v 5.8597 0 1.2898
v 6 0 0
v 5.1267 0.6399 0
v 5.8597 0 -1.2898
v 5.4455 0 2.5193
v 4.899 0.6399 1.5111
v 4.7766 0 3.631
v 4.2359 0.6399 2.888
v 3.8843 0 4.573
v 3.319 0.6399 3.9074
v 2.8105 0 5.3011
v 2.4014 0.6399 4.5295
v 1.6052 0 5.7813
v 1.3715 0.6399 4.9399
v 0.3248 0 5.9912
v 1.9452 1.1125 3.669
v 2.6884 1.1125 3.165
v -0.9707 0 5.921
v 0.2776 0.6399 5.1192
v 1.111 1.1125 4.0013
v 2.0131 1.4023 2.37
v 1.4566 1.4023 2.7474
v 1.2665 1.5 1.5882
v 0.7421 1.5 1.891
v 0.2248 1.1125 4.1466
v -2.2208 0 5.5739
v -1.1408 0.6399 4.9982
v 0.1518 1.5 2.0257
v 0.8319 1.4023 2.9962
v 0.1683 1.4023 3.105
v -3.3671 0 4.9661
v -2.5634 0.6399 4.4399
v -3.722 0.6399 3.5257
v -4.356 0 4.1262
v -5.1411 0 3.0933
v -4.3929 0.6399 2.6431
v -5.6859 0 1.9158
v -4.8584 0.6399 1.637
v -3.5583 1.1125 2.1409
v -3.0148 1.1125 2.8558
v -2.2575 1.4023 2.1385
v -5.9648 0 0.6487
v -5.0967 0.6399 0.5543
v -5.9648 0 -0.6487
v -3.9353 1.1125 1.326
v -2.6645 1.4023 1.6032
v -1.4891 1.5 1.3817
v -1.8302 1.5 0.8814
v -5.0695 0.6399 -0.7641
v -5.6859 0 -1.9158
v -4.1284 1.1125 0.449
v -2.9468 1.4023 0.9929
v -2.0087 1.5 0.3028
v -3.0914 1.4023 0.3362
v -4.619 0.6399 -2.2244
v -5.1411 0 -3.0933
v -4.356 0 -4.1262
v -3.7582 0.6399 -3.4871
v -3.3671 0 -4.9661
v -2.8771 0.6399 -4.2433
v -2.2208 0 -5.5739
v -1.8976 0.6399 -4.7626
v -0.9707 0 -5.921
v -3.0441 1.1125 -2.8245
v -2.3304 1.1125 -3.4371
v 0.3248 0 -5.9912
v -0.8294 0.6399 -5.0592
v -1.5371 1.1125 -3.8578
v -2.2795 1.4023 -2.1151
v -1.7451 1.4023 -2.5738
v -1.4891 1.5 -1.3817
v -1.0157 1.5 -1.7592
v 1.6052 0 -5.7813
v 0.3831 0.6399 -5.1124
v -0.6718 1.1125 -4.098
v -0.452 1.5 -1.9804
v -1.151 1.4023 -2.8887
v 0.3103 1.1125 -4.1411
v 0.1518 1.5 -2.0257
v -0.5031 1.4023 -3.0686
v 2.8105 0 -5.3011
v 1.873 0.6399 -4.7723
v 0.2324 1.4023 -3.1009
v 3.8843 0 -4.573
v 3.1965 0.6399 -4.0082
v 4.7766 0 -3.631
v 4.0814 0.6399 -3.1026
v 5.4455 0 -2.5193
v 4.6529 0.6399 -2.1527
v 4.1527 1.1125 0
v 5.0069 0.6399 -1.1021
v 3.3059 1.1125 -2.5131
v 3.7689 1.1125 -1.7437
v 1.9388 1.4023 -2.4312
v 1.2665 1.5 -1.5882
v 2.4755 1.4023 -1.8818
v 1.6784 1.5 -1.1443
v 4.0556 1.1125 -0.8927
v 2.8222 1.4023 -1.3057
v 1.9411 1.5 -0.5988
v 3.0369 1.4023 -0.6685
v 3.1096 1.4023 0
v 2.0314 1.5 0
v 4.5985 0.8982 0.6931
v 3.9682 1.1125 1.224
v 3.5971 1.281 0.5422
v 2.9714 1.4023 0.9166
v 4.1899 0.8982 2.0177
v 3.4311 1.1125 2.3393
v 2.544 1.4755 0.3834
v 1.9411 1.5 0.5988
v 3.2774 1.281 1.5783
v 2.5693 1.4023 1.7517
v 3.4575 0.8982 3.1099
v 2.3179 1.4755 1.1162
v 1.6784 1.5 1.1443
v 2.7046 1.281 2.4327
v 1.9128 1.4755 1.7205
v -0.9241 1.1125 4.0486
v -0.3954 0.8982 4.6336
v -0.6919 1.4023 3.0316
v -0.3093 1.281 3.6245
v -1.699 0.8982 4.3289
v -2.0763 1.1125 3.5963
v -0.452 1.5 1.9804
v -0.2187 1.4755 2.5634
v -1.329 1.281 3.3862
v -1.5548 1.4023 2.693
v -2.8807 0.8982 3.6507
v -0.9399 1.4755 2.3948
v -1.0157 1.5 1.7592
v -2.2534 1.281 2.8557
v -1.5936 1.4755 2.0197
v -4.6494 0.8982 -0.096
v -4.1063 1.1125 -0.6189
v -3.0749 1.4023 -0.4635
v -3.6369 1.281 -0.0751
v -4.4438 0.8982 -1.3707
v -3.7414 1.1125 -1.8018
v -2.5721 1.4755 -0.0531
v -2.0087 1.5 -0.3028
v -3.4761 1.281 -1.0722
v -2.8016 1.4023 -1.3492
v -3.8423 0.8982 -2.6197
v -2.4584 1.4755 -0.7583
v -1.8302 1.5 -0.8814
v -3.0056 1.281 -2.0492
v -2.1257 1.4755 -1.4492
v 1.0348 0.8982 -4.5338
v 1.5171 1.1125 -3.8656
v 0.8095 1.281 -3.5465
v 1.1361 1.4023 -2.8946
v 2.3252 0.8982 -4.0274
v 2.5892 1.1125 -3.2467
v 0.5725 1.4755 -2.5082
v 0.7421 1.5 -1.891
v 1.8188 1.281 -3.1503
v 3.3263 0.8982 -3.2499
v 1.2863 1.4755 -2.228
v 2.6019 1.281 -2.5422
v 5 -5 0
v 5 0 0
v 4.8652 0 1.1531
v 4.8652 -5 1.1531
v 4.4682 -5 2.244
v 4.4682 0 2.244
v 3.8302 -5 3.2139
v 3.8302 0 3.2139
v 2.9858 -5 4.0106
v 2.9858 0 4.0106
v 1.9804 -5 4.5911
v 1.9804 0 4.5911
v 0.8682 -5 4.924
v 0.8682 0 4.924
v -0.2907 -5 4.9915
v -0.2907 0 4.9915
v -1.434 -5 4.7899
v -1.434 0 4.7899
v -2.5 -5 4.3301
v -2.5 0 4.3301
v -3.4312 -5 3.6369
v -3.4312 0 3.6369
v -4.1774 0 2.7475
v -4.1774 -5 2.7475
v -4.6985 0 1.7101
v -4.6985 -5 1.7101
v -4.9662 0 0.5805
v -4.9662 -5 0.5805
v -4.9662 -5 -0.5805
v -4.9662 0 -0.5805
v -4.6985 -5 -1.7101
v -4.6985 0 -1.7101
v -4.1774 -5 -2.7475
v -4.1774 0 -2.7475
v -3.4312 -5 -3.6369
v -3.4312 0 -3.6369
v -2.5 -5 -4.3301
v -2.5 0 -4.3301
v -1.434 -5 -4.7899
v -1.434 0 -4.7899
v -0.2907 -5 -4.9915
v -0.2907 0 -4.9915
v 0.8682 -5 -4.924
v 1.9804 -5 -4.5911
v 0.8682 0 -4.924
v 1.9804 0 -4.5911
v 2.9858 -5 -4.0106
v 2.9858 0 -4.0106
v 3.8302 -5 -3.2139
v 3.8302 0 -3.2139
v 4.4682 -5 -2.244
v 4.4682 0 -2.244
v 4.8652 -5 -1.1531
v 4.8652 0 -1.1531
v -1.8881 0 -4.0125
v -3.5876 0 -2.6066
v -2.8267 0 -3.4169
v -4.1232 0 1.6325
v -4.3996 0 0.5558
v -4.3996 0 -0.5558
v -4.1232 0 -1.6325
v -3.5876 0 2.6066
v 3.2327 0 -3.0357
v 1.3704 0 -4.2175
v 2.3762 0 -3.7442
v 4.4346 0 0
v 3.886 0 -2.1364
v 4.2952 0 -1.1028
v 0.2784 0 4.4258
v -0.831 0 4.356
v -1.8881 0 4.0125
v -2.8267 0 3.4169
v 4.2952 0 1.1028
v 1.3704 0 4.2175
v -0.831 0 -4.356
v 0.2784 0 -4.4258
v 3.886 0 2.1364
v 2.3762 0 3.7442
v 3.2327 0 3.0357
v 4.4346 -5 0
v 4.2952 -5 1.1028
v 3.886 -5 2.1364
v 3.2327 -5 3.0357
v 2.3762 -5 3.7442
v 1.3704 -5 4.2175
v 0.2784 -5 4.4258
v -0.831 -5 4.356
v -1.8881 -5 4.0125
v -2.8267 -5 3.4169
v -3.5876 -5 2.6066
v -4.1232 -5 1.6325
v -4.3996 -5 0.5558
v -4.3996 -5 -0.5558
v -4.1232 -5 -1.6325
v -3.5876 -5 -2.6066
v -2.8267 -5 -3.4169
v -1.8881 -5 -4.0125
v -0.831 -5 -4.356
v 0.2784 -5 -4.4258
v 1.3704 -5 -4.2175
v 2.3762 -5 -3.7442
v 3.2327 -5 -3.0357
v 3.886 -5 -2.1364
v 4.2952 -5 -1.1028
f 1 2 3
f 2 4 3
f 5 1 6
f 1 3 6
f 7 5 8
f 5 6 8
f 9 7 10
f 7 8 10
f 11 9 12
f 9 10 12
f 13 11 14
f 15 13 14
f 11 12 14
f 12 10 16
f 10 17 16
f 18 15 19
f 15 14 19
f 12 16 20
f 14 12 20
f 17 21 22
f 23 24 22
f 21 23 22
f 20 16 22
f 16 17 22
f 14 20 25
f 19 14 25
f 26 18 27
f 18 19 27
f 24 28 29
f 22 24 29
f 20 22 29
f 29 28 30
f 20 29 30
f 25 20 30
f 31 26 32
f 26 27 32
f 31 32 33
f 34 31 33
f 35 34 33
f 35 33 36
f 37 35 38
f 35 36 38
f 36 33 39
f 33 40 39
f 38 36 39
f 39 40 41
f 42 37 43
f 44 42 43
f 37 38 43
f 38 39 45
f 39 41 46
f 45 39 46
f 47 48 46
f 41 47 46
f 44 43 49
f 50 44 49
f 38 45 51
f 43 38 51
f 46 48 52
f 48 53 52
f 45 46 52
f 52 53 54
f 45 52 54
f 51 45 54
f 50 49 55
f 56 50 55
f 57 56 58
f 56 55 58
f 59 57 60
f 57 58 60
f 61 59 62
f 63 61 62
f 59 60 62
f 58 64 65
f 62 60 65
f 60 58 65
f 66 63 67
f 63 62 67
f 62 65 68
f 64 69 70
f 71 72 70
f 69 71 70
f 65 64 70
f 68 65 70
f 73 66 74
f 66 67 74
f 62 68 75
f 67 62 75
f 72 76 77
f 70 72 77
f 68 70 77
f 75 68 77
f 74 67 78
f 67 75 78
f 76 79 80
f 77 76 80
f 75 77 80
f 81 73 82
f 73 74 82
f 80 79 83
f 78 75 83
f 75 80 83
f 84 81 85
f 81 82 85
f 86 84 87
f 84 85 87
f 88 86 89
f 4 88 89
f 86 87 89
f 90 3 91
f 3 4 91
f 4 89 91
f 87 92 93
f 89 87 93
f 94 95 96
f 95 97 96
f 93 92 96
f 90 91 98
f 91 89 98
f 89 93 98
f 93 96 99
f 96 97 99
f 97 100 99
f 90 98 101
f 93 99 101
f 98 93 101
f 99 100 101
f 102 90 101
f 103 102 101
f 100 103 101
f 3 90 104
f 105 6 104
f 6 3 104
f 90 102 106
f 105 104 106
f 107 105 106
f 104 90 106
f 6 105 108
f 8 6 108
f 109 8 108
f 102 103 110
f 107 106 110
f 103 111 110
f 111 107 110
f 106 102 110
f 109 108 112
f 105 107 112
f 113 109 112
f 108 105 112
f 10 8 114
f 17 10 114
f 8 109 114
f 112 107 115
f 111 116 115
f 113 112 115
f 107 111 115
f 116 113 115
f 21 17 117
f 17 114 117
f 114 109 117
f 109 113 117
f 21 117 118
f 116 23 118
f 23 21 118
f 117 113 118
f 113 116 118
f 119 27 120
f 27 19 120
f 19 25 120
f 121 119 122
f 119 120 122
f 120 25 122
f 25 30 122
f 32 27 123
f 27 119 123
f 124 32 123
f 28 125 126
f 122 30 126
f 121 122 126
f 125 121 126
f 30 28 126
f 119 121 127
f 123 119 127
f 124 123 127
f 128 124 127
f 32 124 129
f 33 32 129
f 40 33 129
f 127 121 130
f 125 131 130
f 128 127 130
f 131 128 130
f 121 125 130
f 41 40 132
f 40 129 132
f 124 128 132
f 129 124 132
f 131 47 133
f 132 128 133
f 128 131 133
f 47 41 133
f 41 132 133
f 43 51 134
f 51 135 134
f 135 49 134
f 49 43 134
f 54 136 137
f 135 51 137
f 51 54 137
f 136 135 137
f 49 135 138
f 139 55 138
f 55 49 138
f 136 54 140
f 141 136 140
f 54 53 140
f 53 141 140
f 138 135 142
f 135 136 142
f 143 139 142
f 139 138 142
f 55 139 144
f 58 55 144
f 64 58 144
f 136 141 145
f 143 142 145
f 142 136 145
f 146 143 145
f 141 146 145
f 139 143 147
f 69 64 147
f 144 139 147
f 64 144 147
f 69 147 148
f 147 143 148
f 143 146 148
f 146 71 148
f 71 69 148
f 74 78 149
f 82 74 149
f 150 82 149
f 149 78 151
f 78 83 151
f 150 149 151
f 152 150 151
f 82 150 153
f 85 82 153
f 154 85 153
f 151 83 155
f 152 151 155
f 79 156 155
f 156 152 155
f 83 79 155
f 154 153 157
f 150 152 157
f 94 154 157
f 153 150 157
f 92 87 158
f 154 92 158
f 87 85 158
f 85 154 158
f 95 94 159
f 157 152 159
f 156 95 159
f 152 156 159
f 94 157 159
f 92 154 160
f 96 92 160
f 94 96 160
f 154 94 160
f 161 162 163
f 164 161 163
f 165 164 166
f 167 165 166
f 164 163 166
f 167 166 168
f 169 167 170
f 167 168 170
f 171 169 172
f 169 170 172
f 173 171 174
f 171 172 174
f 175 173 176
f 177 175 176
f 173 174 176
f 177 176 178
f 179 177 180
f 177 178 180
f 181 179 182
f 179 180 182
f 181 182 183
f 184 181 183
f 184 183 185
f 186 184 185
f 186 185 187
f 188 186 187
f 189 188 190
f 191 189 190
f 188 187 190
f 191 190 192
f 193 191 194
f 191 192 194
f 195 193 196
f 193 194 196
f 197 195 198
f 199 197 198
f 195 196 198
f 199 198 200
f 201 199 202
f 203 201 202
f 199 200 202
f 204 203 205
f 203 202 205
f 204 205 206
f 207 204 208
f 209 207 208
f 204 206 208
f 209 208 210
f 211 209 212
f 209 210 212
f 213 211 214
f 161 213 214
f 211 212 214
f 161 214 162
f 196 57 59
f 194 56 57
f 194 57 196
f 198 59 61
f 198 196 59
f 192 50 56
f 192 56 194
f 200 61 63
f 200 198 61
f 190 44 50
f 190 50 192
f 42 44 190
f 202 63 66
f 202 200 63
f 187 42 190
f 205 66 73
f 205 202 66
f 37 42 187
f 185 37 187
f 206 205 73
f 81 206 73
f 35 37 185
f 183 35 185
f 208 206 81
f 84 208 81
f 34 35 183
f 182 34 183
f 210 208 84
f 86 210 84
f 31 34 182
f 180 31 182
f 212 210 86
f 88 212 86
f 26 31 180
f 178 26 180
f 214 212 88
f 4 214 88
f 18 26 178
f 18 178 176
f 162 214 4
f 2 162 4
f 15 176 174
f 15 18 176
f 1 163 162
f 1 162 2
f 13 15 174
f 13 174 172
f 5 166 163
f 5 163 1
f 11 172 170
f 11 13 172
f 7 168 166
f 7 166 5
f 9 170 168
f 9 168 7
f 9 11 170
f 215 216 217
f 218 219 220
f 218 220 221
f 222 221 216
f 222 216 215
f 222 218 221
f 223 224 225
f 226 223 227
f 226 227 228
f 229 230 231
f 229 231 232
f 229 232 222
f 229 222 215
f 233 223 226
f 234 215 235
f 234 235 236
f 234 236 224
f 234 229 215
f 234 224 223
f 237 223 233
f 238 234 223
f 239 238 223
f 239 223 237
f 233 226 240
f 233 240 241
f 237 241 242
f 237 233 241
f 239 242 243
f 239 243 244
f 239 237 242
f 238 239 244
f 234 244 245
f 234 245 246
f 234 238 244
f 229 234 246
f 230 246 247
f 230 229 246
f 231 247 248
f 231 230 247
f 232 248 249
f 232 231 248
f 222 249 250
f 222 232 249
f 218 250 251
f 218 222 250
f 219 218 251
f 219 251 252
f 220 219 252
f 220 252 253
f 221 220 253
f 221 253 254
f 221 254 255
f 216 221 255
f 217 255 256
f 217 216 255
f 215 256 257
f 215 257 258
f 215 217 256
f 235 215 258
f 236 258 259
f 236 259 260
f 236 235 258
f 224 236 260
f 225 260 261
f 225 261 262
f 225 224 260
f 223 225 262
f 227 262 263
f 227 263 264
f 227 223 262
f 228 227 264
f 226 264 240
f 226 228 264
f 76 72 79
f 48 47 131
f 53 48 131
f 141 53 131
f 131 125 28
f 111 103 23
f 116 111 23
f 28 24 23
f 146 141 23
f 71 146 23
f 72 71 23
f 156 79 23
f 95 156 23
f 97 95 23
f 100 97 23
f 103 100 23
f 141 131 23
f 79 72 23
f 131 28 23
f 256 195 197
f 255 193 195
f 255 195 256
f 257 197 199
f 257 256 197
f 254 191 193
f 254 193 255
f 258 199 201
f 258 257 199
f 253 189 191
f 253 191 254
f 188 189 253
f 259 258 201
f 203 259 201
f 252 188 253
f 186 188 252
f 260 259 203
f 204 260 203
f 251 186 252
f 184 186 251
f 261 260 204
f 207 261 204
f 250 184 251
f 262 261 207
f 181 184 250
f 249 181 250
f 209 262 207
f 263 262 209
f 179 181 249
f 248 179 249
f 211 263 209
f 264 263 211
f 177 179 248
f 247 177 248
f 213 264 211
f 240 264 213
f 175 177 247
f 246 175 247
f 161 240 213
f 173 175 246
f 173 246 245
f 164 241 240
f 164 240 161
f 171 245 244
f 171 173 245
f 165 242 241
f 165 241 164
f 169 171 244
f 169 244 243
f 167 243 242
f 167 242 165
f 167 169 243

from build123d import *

# Parameters (mm, degrees)
F0_R     = 5
F0_R_2   = 4.4345680592
F1_DEPTH = 5
F2_R     = 6
F3_DEPTH = 1.5


# Not quite as in the source:
# - a fillet or chamfer that OpenCascade refuses, or shapes differently, is made with other operations: its cross-section is extruded or revolved along the edge and cut away or added


with BuildPart() as f1:
    # F0 (on Front) → F1 (new body)
    with BuildSketch(Plane.XZ):
        Circle(F0_R)
        Circle(F0_R_2, mode=Mode.SUBTRACT)
    extrude(amount=F1_DEPTH)

    # F2 (on Front) → F3 (join)
    with BuildSketch(Plane.XZ):
        Circle(F2_R)
    extrude(amount=-F3_DEPTH)

    # F4: fillet of radius 6 on 1 edges, made by hand

    # F4_s1 → F4_t2 (revolve, cut)
    with BuildSketch(Plane.XY):
        with BuildLine():
            ThreePointArc((6, 0), (4.152693377, 1.1124860802), (2.0313730334, 1.5))
            Line((2.0313730334, 1.5), (2.0313730334, 1.62))
            Line((2.0313730334, 1.62), (6, 1.62))
            Line((6, 1.62), (6.12, 1.5))
            ThreePointArc((6.12, 1.5), (6.12, 0.75), (6.0793725393, 0.09))
            Line((6.0793725393, 0.09), (6, 0))
        make_face()
    revolve(axis=Axis((0, 1.5, 0), (0, -1, 0)), mode=Mode.SUBTRACT)


solid = f1.part
